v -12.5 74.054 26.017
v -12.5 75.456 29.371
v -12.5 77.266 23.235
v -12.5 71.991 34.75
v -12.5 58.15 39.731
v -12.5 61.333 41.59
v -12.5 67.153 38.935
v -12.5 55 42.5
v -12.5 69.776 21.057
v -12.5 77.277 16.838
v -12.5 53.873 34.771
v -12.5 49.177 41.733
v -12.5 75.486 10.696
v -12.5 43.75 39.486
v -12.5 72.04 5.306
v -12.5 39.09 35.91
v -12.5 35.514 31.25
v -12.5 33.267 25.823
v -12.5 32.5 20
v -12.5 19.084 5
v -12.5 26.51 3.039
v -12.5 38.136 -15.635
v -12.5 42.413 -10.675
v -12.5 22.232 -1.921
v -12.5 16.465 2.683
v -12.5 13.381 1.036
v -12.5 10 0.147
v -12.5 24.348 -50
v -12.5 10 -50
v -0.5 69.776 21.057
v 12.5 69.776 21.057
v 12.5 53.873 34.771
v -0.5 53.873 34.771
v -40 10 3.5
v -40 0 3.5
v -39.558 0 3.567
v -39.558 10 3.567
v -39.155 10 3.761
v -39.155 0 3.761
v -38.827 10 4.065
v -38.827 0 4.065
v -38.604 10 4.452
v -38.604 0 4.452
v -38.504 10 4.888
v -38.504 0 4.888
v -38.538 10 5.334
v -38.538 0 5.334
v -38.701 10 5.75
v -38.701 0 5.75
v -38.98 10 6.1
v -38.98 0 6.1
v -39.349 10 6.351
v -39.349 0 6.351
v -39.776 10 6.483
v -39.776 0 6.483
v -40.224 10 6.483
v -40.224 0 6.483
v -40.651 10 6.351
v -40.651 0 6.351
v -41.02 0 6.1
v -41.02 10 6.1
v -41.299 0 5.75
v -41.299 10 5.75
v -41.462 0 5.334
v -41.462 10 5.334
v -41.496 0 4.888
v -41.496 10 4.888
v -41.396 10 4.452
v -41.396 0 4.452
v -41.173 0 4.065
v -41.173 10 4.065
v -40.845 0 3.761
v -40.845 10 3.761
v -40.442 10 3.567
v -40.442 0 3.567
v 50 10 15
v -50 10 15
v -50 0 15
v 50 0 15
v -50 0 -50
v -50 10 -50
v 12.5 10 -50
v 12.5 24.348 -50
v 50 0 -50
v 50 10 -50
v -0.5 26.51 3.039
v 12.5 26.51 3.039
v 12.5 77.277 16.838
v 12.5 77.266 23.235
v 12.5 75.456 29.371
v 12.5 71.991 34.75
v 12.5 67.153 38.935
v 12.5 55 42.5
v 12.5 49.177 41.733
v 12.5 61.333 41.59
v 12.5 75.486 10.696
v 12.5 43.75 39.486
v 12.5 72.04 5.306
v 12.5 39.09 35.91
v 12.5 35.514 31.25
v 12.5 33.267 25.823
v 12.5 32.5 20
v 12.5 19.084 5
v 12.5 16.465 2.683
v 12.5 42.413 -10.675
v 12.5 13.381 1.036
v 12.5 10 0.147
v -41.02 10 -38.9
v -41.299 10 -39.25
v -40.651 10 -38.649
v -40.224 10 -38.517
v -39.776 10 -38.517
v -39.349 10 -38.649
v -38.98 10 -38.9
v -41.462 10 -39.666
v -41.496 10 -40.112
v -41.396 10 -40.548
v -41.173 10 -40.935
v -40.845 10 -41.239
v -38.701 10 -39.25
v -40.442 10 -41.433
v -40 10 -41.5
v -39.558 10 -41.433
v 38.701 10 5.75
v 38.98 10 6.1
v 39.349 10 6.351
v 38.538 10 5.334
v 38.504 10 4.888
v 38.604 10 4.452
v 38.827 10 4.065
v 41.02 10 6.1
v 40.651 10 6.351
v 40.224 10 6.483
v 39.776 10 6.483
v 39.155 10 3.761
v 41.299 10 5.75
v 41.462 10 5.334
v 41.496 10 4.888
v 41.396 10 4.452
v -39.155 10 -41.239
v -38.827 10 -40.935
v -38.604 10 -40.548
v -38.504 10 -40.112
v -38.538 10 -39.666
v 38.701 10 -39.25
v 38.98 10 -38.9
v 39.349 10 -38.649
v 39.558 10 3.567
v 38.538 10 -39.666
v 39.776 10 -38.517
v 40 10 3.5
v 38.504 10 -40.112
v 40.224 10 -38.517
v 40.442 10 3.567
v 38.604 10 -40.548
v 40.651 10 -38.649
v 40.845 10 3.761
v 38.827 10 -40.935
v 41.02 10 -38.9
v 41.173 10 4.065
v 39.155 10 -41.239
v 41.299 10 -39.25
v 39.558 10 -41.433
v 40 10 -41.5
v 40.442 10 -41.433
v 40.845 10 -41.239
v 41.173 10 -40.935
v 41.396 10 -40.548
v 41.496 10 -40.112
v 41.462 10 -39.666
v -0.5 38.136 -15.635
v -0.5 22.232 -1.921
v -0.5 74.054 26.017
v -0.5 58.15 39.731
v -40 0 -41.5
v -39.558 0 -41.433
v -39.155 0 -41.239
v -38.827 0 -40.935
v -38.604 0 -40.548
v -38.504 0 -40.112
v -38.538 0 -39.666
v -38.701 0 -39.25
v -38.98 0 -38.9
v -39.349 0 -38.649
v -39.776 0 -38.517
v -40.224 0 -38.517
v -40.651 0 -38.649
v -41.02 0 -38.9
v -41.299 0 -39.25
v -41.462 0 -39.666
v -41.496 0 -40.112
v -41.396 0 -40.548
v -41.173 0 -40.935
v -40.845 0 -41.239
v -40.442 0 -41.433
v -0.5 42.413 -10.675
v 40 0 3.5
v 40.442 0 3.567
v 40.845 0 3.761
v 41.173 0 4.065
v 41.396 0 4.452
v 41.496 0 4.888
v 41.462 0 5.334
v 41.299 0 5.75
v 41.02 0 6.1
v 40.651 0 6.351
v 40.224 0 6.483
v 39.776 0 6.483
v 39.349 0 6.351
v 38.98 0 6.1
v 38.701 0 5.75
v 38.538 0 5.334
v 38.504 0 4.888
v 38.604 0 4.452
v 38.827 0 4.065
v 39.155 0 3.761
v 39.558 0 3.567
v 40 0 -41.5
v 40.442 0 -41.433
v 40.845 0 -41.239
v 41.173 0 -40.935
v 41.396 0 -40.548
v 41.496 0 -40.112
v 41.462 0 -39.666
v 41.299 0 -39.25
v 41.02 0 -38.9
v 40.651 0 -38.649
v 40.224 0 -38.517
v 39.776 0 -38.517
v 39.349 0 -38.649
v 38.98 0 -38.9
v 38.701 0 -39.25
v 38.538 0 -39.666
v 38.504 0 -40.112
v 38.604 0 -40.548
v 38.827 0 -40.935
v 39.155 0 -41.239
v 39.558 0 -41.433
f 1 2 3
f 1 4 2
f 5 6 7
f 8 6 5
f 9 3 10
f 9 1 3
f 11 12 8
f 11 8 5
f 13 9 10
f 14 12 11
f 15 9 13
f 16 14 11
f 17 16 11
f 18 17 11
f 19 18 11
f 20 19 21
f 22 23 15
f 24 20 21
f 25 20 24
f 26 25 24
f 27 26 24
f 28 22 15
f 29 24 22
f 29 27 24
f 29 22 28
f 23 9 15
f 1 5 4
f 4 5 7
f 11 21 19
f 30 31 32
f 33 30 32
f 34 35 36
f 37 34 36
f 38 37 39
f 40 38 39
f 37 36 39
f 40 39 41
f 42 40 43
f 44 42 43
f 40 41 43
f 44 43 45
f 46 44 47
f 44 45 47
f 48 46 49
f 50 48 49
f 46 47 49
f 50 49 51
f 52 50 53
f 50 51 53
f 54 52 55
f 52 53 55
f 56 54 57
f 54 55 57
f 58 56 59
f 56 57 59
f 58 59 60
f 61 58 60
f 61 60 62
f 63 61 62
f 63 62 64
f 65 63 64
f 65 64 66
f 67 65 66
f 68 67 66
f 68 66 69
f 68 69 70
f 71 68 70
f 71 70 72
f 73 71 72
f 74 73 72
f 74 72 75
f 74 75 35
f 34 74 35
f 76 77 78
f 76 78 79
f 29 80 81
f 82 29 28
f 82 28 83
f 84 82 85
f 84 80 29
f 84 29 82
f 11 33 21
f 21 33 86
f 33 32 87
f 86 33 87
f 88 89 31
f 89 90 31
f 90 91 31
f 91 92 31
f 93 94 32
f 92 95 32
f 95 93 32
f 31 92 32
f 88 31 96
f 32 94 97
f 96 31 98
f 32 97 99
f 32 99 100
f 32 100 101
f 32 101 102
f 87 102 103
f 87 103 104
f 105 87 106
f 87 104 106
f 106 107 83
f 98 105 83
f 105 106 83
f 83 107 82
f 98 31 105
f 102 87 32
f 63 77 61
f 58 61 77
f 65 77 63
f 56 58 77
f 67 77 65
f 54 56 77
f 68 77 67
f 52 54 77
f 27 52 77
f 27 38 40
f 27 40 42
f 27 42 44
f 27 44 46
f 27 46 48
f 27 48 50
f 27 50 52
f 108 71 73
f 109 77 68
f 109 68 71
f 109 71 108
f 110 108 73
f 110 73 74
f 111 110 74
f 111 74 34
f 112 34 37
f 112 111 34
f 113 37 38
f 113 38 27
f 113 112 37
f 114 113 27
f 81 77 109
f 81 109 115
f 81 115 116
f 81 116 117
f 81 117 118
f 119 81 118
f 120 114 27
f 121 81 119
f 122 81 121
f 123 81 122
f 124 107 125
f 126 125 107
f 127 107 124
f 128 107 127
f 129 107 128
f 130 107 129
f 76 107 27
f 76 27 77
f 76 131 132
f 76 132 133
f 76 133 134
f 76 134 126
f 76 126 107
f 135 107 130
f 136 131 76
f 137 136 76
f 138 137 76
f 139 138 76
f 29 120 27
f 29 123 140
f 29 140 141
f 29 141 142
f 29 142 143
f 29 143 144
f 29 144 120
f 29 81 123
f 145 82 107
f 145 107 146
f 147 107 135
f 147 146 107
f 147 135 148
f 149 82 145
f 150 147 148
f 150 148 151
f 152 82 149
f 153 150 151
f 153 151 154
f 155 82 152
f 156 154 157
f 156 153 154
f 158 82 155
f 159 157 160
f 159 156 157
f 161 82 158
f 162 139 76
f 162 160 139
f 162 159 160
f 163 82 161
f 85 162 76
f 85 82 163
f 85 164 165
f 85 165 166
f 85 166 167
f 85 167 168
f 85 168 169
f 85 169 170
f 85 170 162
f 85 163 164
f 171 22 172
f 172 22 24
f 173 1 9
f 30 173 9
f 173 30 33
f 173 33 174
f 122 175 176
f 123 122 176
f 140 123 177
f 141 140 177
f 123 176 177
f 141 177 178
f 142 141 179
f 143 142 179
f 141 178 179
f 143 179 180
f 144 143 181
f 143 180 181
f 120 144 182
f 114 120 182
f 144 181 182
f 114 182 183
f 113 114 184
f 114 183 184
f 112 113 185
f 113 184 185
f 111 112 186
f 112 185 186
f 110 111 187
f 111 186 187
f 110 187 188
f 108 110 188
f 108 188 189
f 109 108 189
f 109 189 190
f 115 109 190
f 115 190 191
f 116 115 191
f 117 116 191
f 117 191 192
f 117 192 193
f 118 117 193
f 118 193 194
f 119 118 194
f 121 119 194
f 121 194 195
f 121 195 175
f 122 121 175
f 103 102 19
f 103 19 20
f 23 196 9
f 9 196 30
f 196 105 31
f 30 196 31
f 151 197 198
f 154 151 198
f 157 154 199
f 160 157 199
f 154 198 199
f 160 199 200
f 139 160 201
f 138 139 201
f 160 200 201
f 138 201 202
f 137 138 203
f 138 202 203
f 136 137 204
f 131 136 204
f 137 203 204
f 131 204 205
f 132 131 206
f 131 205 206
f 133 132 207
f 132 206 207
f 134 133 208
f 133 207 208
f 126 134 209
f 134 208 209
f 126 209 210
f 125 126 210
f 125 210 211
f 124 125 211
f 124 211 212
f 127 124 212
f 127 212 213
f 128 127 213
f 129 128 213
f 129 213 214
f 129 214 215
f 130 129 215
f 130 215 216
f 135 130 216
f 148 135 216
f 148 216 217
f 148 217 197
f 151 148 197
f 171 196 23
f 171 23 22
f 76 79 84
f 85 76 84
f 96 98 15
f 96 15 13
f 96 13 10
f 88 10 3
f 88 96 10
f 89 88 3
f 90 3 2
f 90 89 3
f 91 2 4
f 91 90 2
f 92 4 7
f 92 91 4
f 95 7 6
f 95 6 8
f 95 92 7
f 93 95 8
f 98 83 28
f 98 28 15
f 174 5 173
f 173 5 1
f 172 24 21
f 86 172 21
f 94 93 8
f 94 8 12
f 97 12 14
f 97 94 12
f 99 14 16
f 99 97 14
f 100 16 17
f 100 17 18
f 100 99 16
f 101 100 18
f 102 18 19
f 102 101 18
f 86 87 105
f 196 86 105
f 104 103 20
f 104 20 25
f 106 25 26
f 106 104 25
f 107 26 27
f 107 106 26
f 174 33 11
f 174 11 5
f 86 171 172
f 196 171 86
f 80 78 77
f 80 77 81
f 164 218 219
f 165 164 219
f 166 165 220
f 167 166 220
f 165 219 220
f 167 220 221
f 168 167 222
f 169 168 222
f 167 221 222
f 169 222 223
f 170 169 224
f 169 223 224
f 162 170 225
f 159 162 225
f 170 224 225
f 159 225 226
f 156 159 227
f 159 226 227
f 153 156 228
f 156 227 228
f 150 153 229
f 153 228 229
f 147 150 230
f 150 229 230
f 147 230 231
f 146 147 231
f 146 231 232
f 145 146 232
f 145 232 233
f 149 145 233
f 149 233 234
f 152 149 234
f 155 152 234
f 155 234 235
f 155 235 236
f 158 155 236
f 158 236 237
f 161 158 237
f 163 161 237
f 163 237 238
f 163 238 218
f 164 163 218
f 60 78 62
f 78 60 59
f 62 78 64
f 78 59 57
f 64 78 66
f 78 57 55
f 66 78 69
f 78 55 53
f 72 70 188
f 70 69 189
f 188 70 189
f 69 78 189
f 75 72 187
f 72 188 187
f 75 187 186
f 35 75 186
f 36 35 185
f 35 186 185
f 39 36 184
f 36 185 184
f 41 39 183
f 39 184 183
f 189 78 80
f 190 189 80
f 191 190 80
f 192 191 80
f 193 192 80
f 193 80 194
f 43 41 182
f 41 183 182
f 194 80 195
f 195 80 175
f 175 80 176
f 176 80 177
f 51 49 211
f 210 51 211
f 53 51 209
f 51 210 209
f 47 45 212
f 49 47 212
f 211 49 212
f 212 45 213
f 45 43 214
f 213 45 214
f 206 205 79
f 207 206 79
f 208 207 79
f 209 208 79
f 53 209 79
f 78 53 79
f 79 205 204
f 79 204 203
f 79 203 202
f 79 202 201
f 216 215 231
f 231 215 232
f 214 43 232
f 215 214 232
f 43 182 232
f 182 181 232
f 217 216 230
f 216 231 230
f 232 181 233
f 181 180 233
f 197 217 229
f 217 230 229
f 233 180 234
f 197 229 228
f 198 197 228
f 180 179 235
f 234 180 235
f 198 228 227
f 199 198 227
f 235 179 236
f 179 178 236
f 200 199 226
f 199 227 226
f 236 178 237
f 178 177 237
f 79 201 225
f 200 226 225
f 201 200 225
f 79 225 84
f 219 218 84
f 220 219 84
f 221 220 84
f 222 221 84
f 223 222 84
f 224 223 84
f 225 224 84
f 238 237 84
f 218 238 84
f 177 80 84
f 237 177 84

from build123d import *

# Parameters (mm, degrees)
SKETCH2_W               = 100
SKETCH2_H               = 100
BOSS_EXTRUDE1_DEPTH     = 10
SKETCH3_W               = 25
SKETCH3_H               = 100
BOSS_EXTRUDE2_DEPTH     = 100
CUT_EXTRUDE3_DEPTH      = 137.037678604
CUT_EXTRUDE3_DEPTH_BACK = 137.037678604
CUT_EXTRUDE4_DEPTH      = 112.411399776
CUT_EXTRUDE4_DEPTH_BACK = 112.411399776
CUT_EXTRUDE5_DEPTH      = 12
CUT_EXTRUDE7_DEPTH      = 105.910676292
CUT_EXTRUDE7_DEPTH_BACK = 10
SKETCH16_W              = 100
SKETCH16_H              = 35
SKETCH17_R              = 1.5
CUT_EXTRUDE8_DEPTH      = 105.910676292


with BuildPart() as part:
    # Sketch2 → Boss-Extrude1 (new body)
    with BuildSketch(Plane(origin=(0, 0, 0), x_dir=(1, 0, 0), z_dir=(0, 1, 0))):
        Rectangle(SKETCH2_W, SKETCH2_H)
    extrude(amount=BOSS_EXTRUDE1_DEPTH)

    # Sketch3 → Boss-Extrude2 (add)
    with BuildSketch(Plane(origin=(0, 10, 0), x_dir=(1, 0, 0), z_dir=(0, 1, 0))):
        Rectangle(SKETCH3_W, SKETCH3_H)
    extrude(amount=BOSS_EXTRUDE2_DEPTH)

    # Sketch4 → Cut-Extrude3 (cut, two sides: drawn at the far end of the back side and taken through both)
    with BuildSketch(Plane.ZY.offset(12.5).offset(-CUT_EXTRUDE3_DEPTH_BACK)):
        with BuildLine():
            ThreePointArc((5, 19.083592135), (1.769637802, 14.971315355), (0.147267966, 10))
            Line((0.147267966, 10), (50, 10))
            Line((50, 10), (50, 110))
            Line((50, 110), (-50, 110))
            Line((-50, 110), (-50, 24.347807147))
            Line((-50, 24.347807147), (5.30640787, 72.039611214))
            ThreePointArc((5.30640787, 72.039611214), (29.371344009, 75.45551054), (42.5, 55))
            ThreePointArc((42.5, 55), (35.909902577, 39.090097423), (20, 32.5))
            Line((20, 32.5), (5, 19.083592135))
        make_face()
    extrude(amount=CUT_EXTRUDE3_DEPTH + CUT_EXTRUDE3_DEPTH_BACK, mode=Mode.SUBTRACT)

    # Sketch13 → Cut-Extrude4 (cut, two sides: drawn at the far end of the back side and taken through both)
    with BuildSketch(Plane.ZY.offset(12.5).offset(-CUT_EXTRUDE4_DEPTH_BACK)):
        Polygon((3.039419763, 26.509804879), (-10.674599558, 42.413442012), (21.056943103, 69.7761758), (34.770962424, 53.872538667), align=None)
    extrude(amount=CUT_EXTRUDE4_DEPTH + CUT_EXTRUDE4_DEPTH_BACK, mode=Mode.SUBTRACT)

    # Sketch14 → Cut-Extrude5 (cut)
    with BuildSketch(Plane.ZY.offset(12.5)):
        Polygon((-15.635019711, 38.135974081), (-1.92100039, 22.232336948), (39.731382578, 58.150006598), (26.017363257, 74.053643731), align=None)
    extrude(amount=-CUT_EXTRUDE5_DEPTH, mode=Mode.SUBTRACT)

    # Sketch16 → Cut-Extrude7 (cut, two sides: drawn at the far end of the back side and taken through both)
    with BuildSketch(Plane.XZ.offset(-CUT_EXTRUDE7_DEPTH_BACK)):
        with Locations((0, 32.5)):
            Rectangle(SKETCH16_W, SKETCH16_H)
    extrude(amount=CUT_EXTRUDE7_DEPTH + CUT_EXTRUDE7_DEPTH_BACK, mode=Mode.SUBTRACT)

    # Sketch17 → Cut-Extrude8 (cut, through all)
    with BuildSketch(Plane.XZ):
        with Locations(Location((-40, 5, 0), (0, 0, 270))):
            Circle(SKETCH17_R)
        with Locations(Location((40, 5, 0), (0, 0, 270))):
            Circle(SKETCH17_R)
        with Locations(Location((40, -40, 0), (0, 0, 270))):
            Circle(SKETCH17_R)
        with Locations(Location((-40, -40, 0), (0, 0, 270))):
            Circle(SKETCH17_R)
    extrude(amount=-CUT_EXTRUDE8_DEPTH, mode=Mode.SUBTRACT)


solid = part.part
